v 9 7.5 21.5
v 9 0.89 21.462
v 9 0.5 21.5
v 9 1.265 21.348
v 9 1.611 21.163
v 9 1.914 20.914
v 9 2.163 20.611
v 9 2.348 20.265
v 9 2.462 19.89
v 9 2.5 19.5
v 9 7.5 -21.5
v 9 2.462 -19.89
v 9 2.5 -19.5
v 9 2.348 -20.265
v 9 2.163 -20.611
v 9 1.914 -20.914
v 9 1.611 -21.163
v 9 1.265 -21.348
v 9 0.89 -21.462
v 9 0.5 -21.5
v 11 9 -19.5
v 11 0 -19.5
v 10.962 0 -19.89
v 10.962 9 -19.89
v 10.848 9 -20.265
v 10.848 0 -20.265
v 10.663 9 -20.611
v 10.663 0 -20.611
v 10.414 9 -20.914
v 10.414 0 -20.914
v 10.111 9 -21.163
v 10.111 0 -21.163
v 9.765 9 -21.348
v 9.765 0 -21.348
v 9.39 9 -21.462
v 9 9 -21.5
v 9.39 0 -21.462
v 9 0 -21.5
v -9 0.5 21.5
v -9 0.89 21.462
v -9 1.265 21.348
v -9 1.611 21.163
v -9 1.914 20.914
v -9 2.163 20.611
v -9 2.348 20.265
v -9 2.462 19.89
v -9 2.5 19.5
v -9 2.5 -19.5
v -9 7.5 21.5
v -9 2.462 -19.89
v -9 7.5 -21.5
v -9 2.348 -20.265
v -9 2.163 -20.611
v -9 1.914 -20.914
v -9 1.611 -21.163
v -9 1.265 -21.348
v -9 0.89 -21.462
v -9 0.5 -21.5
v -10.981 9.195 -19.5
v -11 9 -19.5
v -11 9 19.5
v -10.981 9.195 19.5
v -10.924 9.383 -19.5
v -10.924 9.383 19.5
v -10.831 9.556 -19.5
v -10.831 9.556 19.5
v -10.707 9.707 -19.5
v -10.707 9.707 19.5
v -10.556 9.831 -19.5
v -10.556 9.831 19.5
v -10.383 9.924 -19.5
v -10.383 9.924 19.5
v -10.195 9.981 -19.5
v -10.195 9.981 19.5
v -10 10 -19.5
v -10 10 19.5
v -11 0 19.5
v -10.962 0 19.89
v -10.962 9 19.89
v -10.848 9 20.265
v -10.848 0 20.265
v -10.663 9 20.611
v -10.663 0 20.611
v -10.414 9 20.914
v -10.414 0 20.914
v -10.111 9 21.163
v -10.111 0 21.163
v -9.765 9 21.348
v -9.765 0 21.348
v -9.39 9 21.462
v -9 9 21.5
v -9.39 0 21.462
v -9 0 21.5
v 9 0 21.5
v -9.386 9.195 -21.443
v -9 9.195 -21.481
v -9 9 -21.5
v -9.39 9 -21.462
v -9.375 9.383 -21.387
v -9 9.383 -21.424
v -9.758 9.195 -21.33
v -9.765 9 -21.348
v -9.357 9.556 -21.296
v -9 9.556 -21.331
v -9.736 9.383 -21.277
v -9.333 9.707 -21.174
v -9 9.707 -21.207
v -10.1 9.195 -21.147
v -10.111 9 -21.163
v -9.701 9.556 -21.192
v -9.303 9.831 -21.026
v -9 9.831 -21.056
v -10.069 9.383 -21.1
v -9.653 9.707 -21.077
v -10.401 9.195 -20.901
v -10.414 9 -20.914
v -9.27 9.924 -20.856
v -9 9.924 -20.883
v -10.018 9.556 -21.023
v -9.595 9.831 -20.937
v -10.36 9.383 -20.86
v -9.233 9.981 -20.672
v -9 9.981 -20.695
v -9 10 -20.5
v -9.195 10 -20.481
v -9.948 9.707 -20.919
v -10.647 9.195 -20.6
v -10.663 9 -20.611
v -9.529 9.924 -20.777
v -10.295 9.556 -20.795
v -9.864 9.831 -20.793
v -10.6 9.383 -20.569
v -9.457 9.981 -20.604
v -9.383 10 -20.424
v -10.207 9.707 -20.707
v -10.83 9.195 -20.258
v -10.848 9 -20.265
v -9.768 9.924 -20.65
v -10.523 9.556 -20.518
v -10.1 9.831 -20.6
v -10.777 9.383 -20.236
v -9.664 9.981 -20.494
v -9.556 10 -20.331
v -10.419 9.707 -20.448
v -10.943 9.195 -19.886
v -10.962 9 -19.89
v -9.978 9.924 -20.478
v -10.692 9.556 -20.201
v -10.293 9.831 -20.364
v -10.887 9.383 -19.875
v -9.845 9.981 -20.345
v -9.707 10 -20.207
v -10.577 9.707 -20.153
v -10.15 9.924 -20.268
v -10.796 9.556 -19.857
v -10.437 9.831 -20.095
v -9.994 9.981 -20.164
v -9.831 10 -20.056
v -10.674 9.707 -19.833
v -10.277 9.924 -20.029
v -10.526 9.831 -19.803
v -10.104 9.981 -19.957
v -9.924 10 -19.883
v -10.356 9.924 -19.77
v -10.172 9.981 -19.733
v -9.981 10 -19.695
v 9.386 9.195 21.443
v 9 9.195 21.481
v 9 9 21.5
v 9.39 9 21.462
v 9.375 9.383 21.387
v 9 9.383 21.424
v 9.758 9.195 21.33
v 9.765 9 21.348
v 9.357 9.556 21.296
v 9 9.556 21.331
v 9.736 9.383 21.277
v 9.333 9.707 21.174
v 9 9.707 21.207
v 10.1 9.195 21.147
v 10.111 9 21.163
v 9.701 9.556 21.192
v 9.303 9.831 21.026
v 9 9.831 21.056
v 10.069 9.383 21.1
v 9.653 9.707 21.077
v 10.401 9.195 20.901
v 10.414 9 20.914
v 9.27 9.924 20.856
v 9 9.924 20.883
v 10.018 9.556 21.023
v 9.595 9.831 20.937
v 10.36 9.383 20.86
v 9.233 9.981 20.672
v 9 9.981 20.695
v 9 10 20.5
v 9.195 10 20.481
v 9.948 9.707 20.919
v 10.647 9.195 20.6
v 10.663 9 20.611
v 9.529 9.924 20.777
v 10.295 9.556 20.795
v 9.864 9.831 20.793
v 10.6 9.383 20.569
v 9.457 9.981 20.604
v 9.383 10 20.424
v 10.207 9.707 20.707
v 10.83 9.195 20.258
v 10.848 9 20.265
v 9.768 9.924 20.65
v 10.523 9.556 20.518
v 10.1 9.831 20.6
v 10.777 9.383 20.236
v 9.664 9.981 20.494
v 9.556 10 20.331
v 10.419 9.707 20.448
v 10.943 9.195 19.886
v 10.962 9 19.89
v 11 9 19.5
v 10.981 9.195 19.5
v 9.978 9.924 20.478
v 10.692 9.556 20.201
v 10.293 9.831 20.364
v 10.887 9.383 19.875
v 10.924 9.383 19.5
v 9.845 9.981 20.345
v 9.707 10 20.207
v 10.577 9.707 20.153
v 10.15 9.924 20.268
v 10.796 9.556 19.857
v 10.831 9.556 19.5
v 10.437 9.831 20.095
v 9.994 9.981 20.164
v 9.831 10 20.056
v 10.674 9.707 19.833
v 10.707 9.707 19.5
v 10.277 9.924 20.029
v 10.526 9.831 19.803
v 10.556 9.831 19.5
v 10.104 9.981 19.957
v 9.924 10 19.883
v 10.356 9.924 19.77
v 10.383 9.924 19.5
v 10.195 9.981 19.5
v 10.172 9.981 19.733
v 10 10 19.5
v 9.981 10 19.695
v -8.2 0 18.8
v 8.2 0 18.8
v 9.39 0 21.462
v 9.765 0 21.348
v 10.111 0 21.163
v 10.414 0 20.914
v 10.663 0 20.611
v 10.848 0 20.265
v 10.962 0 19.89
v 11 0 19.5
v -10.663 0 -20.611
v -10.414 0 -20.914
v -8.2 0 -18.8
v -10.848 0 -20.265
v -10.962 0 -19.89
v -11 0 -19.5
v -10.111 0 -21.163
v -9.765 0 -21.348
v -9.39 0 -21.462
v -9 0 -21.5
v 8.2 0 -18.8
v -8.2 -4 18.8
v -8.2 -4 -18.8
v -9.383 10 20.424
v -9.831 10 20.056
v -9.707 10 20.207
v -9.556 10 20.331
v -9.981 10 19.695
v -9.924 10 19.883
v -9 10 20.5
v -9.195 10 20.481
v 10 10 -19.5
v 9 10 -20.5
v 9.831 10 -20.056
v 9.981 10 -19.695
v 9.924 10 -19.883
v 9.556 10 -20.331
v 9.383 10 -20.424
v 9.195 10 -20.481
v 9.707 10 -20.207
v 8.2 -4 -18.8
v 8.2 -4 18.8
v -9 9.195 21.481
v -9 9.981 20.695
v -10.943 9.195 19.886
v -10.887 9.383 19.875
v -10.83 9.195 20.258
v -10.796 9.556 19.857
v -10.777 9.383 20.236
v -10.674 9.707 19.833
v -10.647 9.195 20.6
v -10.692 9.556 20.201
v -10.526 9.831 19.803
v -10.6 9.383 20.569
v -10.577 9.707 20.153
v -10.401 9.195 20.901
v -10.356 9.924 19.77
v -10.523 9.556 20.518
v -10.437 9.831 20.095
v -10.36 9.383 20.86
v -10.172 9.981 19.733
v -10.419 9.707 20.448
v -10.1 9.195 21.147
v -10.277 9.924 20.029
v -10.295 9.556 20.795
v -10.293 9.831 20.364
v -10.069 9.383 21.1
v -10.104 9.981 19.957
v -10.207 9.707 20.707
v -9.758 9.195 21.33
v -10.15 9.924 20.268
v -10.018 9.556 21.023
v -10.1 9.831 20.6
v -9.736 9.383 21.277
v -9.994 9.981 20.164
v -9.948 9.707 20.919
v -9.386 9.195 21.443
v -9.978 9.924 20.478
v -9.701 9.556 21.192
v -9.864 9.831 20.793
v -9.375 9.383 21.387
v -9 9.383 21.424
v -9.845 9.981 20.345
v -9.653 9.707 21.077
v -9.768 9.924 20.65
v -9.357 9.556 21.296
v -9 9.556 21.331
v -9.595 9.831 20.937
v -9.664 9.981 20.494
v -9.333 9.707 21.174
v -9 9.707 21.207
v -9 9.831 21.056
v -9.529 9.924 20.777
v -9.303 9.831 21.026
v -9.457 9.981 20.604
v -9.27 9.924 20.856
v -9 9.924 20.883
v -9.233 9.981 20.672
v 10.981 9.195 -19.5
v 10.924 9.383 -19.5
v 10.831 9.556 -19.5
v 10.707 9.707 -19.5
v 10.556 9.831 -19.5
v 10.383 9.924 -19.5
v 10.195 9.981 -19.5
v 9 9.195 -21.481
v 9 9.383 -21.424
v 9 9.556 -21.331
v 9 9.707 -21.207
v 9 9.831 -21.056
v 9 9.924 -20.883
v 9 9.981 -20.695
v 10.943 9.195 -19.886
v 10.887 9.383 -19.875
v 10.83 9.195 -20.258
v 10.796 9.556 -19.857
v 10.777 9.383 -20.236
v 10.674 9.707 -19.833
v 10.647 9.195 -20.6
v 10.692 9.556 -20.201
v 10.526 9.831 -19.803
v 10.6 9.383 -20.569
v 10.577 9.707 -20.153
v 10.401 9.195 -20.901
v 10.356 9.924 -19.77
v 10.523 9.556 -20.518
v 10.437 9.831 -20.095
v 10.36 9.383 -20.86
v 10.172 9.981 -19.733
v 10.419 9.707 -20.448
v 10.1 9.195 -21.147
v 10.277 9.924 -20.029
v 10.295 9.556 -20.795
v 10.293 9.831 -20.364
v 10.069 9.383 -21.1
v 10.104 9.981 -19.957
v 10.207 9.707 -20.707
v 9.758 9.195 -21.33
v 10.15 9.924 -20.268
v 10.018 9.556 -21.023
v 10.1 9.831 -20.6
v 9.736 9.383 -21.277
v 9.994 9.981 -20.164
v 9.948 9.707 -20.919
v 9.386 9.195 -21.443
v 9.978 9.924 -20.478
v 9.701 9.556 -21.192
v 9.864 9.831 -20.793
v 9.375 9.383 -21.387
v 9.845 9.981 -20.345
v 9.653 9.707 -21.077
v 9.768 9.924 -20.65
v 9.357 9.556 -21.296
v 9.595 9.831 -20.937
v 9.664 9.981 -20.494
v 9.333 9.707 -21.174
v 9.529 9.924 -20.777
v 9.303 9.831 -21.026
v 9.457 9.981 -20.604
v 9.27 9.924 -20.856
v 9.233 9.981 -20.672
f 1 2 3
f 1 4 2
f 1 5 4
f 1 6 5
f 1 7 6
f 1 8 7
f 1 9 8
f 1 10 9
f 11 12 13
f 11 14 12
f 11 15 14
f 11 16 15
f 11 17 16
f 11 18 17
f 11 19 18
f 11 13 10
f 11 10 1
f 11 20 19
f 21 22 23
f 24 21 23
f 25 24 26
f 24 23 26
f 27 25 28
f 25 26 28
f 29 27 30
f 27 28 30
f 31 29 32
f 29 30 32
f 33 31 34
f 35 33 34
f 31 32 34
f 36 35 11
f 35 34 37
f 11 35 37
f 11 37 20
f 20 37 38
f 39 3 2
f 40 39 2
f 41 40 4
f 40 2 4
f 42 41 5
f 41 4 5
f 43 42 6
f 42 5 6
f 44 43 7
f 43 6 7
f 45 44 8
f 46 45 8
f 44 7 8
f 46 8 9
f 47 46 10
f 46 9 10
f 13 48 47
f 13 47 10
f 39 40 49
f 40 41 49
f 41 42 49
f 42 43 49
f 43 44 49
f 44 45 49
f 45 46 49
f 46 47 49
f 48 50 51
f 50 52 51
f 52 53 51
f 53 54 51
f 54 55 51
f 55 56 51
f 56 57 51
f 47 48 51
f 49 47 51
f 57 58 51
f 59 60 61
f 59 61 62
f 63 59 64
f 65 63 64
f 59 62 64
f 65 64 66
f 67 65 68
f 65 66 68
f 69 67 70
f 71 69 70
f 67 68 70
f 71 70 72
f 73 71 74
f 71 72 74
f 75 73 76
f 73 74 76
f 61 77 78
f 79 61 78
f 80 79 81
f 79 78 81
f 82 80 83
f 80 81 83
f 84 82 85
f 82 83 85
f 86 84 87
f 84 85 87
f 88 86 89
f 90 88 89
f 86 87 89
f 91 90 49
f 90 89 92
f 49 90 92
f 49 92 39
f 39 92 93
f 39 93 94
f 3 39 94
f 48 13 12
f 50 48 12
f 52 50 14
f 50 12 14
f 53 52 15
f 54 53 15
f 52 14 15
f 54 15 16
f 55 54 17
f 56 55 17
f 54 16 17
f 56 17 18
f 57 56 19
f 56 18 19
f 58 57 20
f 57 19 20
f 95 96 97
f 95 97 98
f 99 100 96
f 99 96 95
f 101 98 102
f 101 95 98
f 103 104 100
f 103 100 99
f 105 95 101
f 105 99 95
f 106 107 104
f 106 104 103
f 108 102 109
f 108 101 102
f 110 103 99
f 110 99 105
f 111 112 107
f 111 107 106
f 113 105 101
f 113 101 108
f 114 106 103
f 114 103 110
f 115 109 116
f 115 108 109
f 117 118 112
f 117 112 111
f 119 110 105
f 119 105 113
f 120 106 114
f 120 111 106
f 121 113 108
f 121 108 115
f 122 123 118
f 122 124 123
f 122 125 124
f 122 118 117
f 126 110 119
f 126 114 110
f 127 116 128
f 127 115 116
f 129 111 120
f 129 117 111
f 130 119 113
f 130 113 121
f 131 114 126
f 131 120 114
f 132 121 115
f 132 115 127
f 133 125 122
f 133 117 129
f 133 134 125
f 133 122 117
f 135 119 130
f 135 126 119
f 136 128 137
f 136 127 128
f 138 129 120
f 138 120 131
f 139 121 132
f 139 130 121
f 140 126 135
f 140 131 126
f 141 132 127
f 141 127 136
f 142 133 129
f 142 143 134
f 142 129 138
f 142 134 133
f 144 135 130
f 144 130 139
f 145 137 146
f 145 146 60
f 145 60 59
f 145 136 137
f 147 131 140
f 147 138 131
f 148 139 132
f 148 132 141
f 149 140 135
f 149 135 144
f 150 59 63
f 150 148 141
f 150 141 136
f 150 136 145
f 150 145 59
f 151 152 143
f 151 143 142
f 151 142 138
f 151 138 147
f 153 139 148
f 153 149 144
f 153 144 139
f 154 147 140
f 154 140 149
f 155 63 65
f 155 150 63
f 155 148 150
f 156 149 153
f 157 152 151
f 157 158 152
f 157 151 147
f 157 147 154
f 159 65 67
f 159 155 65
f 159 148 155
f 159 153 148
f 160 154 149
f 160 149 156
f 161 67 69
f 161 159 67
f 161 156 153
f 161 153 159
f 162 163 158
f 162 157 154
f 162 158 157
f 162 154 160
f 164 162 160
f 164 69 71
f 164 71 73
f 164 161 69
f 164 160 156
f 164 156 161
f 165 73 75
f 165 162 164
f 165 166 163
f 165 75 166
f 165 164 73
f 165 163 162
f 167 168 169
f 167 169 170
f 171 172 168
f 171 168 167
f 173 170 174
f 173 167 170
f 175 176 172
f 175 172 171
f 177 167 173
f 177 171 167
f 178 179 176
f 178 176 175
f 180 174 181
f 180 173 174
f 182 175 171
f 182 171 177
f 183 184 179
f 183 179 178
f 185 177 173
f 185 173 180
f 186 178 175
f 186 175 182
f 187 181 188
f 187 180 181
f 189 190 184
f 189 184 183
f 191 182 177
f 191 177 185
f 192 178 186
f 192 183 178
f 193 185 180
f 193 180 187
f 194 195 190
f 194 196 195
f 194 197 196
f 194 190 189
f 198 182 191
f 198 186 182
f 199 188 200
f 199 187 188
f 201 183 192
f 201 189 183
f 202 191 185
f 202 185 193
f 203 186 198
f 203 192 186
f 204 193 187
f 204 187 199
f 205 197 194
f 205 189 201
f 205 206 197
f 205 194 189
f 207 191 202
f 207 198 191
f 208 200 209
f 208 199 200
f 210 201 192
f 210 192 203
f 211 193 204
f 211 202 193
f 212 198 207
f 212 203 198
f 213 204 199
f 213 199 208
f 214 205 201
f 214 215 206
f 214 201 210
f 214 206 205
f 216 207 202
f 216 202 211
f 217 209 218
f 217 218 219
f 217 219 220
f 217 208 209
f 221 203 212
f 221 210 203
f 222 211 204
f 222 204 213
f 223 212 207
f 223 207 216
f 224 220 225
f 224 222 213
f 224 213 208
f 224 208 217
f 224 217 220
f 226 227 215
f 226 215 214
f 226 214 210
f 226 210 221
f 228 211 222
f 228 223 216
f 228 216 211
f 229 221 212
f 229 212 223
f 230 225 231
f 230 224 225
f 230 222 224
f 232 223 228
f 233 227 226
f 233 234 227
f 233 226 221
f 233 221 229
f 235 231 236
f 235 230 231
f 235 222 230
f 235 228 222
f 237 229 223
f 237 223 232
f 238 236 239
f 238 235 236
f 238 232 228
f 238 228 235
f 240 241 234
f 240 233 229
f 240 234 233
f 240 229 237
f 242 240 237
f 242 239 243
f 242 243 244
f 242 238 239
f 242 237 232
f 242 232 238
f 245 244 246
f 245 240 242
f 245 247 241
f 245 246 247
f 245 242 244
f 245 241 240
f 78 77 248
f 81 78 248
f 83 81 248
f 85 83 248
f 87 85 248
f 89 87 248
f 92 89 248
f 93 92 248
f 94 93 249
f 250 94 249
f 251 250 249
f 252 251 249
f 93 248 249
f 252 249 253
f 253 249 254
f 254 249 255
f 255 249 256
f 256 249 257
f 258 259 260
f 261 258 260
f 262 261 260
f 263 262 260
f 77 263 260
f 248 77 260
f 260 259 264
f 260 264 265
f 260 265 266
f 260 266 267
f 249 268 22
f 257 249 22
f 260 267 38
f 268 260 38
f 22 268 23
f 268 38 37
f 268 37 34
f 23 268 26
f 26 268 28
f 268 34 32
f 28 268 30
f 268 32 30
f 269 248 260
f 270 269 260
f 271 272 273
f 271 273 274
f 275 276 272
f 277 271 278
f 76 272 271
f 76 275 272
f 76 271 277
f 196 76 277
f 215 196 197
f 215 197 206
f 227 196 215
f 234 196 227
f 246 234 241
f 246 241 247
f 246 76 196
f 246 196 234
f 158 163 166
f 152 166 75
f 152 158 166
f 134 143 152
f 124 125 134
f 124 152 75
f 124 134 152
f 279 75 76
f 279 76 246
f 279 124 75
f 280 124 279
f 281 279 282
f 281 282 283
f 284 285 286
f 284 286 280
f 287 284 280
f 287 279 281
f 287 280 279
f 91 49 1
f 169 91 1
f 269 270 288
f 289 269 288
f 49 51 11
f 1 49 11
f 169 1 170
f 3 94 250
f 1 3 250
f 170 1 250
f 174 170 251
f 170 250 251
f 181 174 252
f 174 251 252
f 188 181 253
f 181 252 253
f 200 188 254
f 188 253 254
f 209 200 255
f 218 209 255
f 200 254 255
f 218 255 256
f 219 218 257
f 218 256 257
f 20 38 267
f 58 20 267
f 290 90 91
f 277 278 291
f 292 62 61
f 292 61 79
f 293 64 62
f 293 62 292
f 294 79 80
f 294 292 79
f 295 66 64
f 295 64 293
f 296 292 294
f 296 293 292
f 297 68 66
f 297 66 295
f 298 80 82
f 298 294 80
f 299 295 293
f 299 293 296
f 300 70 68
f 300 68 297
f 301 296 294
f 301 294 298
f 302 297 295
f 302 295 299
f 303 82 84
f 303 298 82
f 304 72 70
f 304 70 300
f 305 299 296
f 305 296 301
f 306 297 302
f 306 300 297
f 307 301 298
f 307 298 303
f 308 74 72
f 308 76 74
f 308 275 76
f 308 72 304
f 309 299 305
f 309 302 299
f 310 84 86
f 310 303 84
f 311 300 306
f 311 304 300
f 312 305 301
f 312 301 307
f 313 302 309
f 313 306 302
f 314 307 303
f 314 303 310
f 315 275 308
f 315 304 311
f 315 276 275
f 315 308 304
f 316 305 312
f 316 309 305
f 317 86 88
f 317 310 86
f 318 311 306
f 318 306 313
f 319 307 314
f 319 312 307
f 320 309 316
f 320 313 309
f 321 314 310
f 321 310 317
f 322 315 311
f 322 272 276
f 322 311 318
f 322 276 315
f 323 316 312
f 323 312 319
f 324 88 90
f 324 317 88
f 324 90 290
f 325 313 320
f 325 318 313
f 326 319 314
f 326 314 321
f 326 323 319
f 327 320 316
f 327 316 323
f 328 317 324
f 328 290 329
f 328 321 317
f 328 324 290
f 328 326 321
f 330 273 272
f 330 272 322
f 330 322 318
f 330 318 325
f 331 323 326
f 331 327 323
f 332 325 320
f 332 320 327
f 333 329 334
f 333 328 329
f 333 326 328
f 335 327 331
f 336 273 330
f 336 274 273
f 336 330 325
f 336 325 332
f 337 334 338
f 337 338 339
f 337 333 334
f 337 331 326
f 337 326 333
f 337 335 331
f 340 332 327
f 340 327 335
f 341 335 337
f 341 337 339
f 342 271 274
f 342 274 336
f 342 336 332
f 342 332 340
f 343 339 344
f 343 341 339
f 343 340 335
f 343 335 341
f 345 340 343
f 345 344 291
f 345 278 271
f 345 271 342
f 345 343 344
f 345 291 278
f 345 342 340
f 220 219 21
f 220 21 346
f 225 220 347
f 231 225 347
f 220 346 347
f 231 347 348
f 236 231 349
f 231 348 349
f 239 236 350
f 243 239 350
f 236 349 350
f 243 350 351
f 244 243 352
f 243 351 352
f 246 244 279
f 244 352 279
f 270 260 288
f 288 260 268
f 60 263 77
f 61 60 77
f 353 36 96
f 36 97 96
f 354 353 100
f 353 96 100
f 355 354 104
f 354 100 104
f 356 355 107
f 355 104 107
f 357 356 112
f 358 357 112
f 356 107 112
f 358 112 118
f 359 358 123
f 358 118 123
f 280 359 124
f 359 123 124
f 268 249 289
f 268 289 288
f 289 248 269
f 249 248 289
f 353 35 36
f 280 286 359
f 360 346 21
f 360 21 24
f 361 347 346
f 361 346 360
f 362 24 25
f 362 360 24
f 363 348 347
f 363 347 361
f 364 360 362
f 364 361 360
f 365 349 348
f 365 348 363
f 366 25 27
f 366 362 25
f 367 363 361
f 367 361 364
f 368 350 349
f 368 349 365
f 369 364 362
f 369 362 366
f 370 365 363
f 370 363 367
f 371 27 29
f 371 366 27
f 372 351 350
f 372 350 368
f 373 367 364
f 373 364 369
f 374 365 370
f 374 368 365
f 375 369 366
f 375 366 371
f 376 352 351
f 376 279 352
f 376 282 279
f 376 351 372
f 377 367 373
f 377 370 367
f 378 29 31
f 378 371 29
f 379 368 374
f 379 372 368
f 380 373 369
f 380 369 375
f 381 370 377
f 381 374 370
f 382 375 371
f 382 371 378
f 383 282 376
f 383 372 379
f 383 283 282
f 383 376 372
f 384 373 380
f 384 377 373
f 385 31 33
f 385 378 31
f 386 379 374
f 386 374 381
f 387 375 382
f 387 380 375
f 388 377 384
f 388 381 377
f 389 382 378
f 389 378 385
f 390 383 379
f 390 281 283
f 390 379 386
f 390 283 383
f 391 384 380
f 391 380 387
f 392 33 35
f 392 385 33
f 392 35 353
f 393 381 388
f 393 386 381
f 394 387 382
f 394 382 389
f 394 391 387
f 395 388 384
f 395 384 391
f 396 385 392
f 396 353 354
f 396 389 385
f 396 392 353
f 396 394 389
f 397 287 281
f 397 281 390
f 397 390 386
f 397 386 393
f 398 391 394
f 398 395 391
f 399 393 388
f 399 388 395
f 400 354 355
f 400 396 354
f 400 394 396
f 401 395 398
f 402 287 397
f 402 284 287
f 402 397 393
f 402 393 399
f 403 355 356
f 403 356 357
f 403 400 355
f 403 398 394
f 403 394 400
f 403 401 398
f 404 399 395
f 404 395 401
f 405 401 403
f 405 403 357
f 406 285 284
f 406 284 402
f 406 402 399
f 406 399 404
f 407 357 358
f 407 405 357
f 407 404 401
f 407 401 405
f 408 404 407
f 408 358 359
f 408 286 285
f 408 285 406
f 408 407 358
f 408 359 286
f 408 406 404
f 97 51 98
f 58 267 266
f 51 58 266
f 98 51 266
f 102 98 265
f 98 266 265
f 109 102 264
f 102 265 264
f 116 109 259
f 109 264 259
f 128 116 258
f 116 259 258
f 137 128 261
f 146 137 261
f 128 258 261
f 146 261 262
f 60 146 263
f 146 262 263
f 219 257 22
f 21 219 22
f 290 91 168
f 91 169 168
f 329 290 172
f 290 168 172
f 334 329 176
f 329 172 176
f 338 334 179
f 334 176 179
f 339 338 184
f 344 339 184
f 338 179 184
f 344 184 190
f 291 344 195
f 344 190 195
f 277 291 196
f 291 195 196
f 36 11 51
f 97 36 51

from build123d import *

# Parameters (mm, degrees)
BOSS_EXTRUDE1_DEPTH = 10
SKETCH1_4_W         = 16.4
SKETCH1_4_H         = 37.6
BOSS_EXTRUDE2_DEPTH = 4
SKETCH3_W           = 18
SKETCH3_H           = 5
CUT_EXTRUDE2_DEPTH  = 70.74955197
FILLET2_R           = 1
FILLET3_R           = 2


with BuildPart() as part:
    # Sketch1 → Boss-Extrude1 (new body)
    with BuildSketch(Plane(origin=(0, 0, 0), x_dir=(1, 0, 0), z_dir=(0, 1, 0))):
        with BuildLine():
            Line((-9, -21.5), (9, -21.5))
            ThreePointArc((9, -21.5), (10.414213562, -20.914213562), (11, -19.5))
            Line((11, -19.5), (11, 19.5))
            ThreePointArc((11, 19.5), (10.414213562, 20.914213562), (9, 21.5))
            Line((9, 21.5), (-9, 21.5))
            ThreePointArc((-9, 21.5), (-10.414213562, 20.914213562), (-11, 19.5))
            Line((-11, 19.5), (-11, -19.5))
            ThreePointArc((-11, -19.5), (-10.414213562, -20.914213562), (-9, -21.5))
        make_face()
    extrude(amount=BOSS_EXTRUDE1_DEPTH)

    # Sketch1<4> → Boss-Extrude2 (add)
    with BuildSketch(Plane(origin=(0, 0, 0), x_dir=(1, 0, 0), z_dir=(0, 1, 0))):
        Rectangle(SKETCH1_4_W, SKETCH1_4_H)
    extrude(amount=-BOSS_EXTRUDE2_DEPTH)

    # Sketch3 → Cut-Extrude2 (cut, through all)
    with BuildSketch(Plane(origin=(-43, 0, -21.5), x_dir=(1, 0, 0), z_dir=(0, 0, 1))):
        with Locations((43, 5)):
            Rectangle(SKETCH3_W, SKETCH3_H)
    extrude(amount=CUT_EXTRUDE2_DEPTH, mode=Mode.SUBTRACT)

    # Fillet2
    fillet2_edges = [part.edges().sort_by_distance(p)[0] for p in [
        (10.414213562, 10, -20.914213562),
        (11, 10, 0),
        (10.414213562, 10, 20.914213562),
        (0, 10, 21.5),
        (-10.414213562, 10, 20.914213562),
        (-11, 10, 0),
        (-10.414213562, 10, -20.914213562),
        (0, 10, -21.5),
    ]]
    fillet(fillet2_edges, radius=FILLET2_R)

    # Fillet3
    # the kernel refuses this fillet: 2 mm, written as the material it takes off along each edge
    with BuildSketch(Plane(origin=(9, 2.5, -21.5), x_dir=(0, -1, 0), z_dir=(-1, 0, 0))) as fillet3_piece_1:
        with BuildLine():
            CenterArc((FILLET3_R, FILLET3_R), FILLET3_R, 180, 90)
            Line((0, FILLET3_R), (0, 0))
            Line((0, 0), (FILLET3_R, 0))
        make_face()
    extrude(amount=18, mode=Mode.SUBTRACT)
    with BuildSketch(Plane(origin=(9, 2.5, 21.5), x_dir=(0, -1, 0), z_dir=(-1, 0, 0))) as fillet3_piece_2:
        with BuildLine():
            CenterArc((FILLET3_R, -FILLET3_R), FILLET3_R, 90, 90)
            Line((0, -FILLET3_R), (0, 0))
            Line((0, 0), (FILLET3_R, 0))
        make_face()
    extrude(amount=18, mode=Mode.SUBTRACT)


solid = part.part
